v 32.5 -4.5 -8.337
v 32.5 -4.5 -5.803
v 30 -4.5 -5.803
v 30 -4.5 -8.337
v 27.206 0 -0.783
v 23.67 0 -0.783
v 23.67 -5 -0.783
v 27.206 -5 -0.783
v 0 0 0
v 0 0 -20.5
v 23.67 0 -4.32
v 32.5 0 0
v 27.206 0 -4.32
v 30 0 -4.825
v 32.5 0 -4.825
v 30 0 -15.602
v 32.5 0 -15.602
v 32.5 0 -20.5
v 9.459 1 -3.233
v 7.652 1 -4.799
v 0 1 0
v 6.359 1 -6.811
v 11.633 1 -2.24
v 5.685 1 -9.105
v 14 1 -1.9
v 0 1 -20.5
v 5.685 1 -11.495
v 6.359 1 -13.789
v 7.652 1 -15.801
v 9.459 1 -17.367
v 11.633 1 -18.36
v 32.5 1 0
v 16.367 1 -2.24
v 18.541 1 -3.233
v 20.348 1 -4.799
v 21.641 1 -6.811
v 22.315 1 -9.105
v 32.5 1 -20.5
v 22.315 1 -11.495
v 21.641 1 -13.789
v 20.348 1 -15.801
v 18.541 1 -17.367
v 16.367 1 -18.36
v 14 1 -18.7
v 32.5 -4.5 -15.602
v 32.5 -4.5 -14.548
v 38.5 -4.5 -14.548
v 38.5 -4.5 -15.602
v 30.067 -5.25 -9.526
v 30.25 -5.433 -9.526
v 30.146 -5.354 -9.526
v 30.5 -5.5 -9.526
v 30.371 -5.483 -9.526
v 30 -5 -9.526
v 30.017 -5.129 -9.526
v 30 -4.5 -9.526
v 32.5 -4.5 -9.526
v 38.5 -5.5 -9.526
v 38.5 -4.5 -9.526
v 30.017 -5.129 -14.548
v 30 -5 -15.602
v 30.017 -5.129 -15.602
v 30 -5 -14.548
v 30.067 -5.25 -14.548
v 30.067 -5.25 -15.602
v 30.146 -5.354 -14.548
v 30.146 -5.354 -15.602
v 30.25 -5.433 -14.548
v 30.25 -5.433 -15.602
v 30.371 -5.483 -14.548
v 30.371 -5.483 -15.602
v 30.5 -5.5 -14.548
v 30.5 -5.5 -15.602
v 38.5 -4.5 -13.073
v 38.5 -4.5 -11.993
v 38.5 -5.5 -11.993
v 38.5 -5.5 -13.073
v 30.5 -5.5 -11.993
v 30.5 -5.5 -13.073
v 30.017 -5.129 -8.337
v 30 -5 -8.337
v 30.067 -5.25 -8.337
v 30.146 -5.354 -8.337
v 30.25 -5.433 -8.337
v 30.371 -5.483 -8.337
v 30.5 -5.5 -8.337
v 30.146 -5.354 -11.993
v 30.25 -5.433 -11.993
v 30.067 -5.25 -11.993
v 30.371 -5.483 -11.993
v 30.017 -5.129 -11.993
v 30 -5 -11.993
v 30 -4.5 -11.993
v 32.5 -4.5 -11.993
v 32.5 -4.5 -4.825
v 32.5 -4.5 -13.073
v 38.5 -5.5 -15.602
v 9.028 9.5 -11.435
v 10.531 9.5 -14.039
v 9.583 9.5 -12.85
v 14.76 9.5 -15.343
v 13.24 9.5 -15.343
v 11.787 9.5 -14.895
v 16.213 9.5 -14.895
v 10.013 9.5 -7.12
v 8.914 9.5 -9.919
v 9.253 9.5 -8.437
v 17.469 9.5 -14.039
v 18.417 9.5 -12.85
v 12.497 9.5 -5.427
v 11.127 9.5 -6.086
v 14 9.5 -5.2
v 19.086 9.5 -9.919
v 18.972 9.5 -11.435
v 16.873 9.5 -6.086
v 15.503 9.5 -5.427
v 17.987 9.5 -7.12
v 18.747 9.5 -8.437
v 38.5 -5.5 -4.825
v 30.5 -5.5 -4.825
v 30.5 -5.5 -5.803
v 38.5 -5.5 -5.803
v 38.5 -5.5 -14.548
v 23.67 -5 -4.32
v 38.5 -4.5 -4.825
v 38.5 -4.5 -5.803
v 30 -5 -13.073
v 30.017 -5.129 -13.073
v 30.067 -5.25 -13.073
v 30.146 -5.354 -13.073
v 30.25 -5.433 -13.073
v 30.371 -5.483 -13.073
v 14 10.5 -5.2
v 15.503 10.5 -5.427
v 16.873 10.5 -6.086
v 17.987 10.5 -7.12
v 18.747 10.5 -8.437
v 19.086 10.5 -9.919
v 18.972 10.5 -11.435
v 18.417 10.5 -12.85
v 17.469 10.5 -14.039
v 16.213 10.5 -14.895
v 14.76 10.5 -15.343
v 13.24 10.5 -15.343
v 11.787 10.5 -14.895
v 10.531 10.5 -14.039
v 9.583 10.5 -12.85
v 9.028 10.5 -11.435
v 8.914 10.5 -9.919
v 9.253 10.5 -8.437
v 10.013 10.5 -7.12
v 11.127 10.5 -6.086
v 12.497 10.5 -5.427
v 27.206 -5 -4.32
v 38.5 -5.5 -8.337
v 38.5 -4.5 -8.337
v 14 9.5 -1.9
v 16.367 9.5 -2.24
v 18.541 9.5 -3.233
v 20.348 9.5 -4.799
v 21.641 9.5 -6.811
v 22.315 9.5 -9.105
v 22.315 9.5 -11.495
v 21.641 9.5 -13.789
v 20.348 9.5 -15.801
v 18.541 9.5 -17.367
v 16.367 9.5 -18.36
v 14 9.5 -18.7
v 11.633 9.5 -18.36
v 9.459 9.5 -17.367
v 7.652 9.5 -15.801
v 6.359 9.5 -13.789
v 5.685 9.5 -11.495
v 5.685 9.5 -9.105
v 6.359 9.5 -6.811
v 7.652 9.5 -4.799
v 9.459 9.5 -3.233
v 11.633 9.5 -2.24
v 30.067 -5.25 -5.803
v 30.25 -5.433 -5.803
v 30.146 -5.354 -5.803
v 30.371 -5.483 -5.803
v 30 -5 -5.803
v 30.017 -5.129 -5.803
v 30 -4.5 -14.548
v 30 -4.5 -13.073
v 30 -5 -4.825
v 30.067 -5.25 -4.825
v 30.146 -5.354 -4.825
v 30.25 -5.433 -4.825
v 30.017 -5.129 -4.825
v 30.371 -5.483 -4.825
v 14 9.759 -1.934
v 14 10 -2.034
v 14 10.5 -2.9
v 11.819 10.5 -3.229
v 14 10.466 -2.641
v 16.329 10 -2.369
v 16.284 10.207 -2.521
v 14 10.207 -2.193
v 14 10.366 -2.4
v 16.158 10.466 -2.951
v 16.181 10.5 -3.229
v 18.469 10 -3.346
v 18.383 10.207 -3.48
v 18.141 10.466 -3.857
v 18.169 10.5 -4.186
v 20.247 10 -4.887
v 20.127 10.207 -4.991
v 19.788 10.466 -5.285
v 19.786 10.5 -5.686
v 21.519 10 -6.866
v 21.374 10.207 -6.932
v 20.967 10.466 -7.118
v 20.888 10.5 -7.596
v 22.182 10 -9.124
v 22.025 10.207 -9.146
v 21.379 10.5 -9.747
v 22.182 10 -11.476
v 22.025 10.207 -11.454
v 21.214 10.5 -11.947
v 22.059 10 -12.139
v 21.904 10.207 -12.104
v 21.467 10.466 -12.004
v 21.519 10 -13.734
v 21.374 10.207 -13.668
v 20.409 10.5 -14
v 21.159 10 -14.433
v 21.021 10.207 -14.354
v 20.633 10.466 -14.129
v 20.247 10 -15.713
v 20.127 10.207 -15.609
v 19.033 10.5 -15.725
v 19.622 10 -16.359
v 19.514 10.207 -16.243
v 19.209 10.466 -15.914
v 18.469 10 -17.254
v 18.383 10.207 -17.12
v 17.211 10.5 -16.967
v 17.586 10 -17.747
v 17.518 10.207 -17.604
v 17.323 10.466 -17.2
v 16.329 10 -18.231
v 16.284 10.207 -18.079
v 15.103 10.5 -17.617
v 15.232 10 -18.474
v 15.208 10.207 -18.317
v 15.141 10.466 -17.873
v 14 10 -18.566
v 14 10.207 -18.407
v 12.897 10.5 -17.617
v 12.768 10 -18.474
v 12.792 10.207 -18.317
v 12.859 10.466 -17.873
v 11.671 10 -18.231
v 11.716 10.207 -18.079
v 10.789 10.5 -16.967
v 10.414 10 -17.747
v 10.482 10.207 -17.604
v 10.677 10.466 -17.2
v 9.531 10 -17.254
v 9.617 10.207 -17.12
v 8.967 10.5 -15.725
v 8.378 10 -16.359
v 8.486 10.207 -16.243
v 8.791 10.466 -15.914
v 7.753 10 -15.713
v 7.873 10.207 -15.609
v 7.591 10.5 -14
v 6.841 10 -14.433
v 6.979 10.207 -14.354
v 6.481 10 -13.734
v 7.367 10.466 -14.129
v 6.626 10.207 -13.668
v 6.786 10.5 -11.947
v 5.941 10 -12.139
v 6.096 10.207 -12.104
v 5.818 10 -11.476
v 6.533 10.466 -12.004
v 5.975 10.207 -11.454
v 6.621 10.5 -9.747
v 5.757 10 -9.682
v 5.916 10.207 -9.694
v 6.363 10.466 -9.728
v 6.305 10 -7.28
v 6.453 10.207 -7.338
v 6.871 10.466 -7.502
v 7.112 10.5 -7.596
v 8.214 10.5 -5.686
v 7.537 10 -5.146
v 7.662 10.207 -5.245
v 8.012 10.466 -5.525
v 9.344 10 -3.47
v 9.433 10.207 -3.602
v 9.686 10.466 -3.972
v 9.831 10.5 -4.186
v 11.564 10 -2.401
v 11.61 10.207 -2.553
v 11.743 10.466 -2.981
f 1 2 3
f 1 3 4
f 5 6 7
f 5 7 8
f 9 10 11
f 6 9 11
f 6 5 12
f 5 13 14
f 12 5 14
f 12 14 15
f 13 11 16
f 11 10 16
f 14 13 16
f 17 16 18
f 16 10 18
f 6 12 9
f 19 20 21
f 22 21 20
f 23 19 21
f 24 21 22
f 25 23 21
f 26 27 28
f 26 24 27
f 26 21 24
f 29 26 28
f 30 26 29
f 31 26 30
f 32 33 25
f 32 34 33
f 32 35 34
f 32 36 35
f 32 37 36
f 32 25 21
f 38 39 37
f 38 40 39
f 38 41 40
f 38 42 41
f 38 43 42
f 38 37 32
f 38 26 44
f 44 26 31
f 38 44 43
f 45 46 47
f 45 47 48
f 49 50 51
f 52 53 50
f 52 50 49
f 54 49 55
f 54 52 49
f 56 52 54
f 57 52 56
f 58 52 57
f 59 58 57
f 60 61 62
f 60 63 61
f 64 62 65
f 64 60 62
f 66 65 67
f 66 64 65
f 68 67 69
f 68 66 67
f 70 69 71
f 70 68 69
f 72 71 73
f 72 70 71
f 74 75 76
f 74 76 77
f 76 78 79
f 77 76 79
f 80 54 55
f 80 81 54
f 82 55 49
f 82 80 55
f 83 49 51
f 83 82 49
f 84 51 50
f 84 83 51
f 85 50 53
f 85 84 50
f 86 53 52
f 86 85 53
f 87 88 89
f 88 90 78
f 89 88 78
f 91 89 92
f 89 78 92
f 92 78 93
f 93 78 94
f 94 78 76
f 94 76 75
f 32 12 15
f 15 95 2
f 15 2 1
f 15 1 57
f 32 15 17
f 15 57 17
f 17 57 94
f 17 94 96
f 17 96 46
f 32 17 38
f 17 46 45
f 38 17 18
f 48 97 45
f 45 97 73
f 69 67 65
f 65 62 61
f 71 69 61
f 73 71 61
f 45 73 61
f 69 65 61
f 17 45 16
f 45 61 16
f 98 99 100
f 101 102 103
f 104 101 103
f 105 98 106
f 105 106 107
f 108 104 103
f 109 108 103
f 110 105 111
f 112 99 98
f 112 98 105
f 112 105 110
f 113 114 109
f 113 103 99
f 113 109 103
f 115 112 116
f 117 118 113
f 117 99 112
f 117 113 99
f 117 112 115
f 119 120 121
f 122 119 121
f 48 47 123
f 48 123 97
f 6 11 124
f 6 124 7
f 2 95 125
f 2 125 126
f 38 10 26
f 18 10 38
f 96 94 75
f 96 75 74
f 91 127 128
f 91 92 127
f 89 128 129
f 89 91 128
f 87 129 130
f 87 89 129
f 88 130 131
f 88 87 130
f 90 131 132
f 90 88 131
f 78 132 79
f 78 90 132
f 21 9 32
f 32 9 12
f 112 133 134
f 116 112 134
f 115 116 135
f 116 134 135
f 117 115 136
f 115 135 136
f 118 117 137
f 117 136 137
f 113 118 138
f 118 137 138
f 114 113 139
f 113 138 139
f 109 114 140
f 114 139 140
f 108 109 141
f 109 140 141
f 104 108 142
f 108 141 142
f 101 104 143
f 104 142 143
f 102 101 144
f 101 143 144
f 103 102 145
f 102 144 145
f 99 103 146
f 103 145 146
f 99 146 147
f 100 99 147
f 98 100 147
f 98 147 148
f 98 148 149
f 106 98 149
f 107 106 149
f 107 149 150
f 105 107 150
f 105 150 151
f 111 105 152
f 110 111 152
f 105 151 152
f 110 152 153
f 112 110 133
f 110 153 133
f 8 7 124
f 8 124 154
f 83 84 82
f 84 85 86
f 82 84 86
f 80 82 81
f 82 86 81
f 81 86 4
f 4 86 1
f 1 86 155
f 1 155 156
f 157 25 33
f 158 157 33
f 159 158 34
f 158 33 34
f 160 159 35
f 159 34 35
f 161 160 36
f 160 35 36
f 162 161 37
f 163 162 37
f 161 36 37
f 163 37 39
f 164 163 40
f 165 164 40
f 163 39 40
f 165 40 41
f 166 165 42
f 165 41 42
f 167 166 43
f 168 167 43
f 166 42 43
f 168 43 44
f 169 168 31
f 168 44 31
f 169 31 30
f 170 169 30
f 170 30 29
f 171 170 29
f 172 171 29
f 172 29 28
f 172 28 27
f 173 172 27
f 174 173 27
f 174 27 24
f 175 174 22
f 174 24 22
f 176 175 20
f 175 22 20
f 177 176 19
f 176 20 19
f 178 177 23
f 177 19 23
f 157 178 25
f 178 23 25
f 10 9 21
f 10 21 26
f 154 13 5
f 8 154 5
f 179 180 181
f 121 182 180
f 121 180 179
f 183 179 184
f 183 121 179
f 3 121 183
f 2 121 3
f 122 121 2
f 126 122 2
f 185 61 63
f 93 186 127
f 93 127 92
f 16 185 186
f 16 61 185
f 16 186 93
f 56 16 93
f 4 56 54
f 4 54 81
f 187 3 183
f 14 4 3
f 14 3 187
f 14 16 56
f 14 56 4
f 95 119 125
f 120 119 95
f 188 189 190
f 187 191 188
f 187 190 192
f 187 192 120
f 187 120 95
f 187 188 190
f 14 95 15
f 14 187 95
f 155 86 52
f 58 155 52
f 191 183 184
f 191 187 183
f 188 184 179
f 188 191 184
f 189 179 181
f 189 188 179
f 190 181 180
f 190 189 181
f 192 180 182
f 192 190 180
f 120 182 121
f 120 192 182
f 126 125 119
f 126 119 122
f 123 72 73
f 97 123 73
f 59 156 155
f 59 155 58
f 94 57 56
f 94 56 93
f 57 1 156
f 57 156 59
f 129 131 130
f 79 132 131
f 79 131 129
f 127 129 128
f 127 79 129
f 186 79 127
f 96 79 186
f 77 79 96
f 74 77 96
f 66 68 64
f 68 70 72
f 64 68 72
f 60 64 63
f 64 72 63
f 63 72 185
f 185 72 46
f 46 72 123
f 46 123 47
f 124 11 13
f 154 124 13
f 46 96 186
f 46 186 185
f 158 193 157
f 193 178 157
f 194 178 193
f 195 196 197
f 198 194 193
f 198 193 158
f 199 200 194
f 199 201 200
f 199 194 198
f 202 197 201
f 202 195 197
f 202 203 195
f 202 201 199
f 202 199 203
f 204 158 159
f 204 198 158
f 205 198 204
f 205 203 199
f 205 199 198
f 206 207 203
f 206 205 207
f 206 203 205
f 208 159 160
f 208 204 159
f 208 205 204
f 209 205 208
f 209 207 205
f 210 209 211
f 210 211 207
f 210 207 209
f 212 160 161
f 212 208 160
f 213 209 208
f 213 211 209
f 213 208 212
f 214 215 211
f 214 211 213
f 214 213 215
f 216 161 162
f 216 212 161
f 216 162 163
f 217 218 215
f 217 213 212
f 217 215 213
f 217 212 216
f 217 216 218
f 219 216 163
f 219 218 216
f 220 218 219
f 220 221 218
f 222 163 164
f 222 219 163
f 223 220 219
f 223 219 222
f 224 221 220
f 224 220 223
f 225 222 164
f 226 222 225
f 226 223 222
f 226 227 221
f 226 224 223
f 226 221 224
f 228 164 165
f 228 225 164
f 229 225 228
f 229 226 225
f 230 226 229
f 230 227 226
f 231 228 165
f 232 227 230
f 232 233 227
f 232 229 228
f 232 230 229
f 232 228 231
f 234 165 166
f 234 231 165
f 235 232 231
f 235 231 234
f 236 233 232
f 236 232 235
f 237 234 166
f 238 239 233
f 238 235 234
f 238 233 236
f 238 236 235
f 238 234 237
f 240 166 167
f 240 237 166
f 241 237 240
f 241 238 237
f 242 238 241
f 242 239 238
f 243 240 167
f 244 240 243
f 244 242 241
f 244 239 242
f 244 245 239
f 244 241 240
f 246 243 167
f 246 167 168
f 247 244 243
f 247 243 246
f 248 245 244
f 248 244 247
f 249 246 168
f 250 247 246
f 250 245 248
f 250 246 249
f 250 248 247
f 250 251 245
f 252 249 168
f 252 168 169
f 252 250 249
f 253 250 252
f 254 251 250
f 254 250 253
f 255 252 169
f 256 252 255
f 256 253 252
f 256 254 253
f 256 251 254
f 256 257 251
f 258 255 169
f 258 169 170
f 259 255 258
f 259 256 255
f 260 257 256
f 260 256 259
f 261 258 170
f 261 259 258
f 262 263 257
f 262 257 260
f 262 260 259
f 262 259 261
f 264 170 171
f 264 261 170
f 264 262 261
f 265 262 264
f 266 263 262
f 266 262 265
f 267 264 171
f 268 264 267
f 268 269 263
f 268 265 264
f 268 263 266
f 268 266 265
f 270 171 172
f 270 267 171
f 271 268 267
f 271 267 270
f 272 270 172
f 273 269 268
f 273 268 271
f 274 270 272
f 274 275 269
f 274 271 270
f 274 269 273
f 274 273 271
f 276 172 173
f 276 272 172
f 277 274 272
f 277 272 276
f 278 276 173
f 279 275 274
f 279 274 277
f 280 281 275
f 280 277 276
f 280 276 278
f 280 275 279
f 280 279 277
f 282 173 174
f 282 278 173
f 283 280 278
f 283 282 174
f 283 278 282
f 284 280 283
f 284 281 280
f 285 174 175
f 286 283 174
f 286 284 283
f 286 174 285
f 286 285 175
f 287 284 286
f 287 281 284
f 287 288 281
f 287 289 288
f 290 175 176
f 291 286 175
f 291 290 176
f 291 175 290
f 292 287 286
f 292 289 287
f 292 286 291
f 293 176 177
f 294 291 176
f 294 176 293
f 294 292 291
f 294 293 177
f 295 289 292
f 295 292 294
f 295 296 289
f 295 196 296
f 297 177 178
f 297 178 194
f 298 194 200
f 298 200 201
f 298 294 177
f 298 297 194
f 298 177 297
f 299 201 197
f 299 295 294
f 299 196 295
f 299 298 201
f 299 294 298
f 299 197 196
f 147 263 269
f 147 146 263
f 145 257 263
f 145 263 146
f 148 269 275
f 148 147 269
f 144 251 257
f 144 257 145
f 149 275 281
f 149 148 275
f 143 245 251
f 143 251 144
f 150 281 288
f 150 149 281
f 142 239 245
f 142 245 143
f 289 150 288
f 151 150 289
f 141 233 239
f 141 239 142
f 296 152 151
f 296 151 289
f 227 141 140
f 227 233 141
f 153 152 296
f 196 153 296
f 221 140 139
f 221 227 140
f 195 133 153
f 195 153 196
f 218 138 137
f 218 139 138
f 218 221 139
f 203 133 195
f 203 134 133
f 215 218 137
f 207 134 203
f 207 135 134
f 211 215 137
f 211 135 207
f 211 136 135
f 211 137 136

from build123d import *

# Parameters (mm, degrees)
CROQUIS1_W              = 32.5
CROQUIS1_H              = 20.5
SALIENTE_EXTRUIR1_DEPTH = 1
CROQUIS2_R              = 8.4
SALIENTE_EXTRUIR2_DEPTH = 9.5
CROQUIS3_W              = 2.5
CROQUIS3_H              = 10.77685143
SALIENTE_EXTRUIR3_DEPTH = 5.5
CROQUIS4_W              = 10.77685143
CROQUIS4_H              = 1
SALIENTE_EXTRUIR4_DEPTH = 6
CROQUIS5_W              = 3.536132023
CROQUIS5_H              = 3.536132023
SALIENTE_EXTRUIR5_DEPTH = 5
CROQUIS7_R              = 5.1
CORTAR_EXTRUIR1_DEPTH   = 1
REDONDEO1_R             = 1
CROQUIS8_W              = 2.533189813
CROQUIS8_H              = 1
CROQUIS8_W_2            = 2.4671066
CROQUIS8_W_3            = 1.475858413
CORTAR_EXTRUIR2_DEPTH   = 12
REDONDEO2_R             = 0.5


with BuildPart() as part:
    # Croquis1 → Saliente-Extruir1 (new body)
    with BuildSketch(Plane(origin=(0, 0, 0), x_dir=(1, 0, 0), z_dir=(0, 1, 0))):
        with Locations((16.25, 10.25)):
            Rectangle(CROQUIS1_W, CROQUIS1_H)
    extrude(amount=SALIENTE_EXTRUIR1_DEPTH)

    # Croquis2 → Saliente-Extruir2 (add)
    with BuildSketch(Plane(origin=(0, 1, 0), x_dir=(1, 0, 0), z_dir=(0, 1, 0))):
        with Locations(Location((14, 10.3, 0), (0, 0, 270))):
            Circle(CROQUIS2_R)
    extrude(amount=SALIENTE_EXTRUIR2_DEPTH)

    # Croquis3 → Saliente-Extruir3 (add)
    with BuildSketch(Plane.XZ):
        with Locations((31.25, -10.213198871)):
            Rectangle(CROQUIS3_W, CROQUIS3_H)
    extrude(amount=SALIENTE_EXTRUIR3_DEPTH)

    # Croquis4 → Saliente-Extruir4 (add)
    with BuildSketch(Plane(origin=(32.5, 0, 0), x_dir=(0, 0, -1), z_dir=(1, 0, 0))):
        with Locations((10.213198871, -5)):
            Rectangle(CROQUIS4_W, CROQUIS4_H)
    extrude(amount=SALIENTE_EXTRUIR4_DEPTH)

    # Croquis5 → Saliente-Extruir5 (add)
    with BuildSketch(Plane.XZ):
        with Locations((25.43823104, -2.55154591)):
            Rectangle(CROQUIS5_W, CROQUIS5_H)
    extrude(amount=SALIENTE_EXTRUIR5_DEPTH)

    # Croquis7 → Cortar-Extruir1 (cut)
    with BuildSketch(Plane(origin=(0, 10.5, 0), x_dir=(1, 0, 0), z_dir=(0, 1, 0))):
        with Locations(Location((14, 10.3, 0), (0, 0, 270))):
            Circle(CROQUIS7_R)
    extrude(amount=-CORTAR_EXTRUIR1_DEPTH, mode=Mode.SUBTRACT)

    # Redondeo1
    redondeo1_edges = [part.edges().sort_by_distance(p)[0] for p in [
        (14, 10.5, -18.7),
    ]]
    fillet(redondeo1_edges, radius=REDONDEO1_R)

    # Croquis8 → Cortar-Extruir2 (cut)
    with BuildSketch(Plane(origin=(38.5, 0, 0), x_dir=(0, 0, -1), z_dir=(1, 0, 0))):
        with Locations((7.06995271, -5)):
            Rectangle(CROQUIS8_W, CROQUIS8_H)
        with Locations((10.759598741, -5)):
            Rectangle(CROQUIS8_W_2, CROQUIS8_H)
        with Locations((13.810440385, -5)):
            Rectangle(CROQUIS8_W_3, CROQUIS8_H)
    extrude(amount=-CORTAR_EXTRUIR2_DEPTH, mode=Mode.SUBTRACT)

    # Redondeo2
    redondeo2_edges = [part.edges().sort_by_distance(p)[0] for p in [
        (30, -5.5, -5.31406548),
        (30, -5.5, -8.931296528),
        (30, -5.5, -12.53283161),
        (30, -5.5, -15.074997088),
    ]]
    fillet(redondeo2_edges, radius=REDONDEO2_R)


solid = part.part
